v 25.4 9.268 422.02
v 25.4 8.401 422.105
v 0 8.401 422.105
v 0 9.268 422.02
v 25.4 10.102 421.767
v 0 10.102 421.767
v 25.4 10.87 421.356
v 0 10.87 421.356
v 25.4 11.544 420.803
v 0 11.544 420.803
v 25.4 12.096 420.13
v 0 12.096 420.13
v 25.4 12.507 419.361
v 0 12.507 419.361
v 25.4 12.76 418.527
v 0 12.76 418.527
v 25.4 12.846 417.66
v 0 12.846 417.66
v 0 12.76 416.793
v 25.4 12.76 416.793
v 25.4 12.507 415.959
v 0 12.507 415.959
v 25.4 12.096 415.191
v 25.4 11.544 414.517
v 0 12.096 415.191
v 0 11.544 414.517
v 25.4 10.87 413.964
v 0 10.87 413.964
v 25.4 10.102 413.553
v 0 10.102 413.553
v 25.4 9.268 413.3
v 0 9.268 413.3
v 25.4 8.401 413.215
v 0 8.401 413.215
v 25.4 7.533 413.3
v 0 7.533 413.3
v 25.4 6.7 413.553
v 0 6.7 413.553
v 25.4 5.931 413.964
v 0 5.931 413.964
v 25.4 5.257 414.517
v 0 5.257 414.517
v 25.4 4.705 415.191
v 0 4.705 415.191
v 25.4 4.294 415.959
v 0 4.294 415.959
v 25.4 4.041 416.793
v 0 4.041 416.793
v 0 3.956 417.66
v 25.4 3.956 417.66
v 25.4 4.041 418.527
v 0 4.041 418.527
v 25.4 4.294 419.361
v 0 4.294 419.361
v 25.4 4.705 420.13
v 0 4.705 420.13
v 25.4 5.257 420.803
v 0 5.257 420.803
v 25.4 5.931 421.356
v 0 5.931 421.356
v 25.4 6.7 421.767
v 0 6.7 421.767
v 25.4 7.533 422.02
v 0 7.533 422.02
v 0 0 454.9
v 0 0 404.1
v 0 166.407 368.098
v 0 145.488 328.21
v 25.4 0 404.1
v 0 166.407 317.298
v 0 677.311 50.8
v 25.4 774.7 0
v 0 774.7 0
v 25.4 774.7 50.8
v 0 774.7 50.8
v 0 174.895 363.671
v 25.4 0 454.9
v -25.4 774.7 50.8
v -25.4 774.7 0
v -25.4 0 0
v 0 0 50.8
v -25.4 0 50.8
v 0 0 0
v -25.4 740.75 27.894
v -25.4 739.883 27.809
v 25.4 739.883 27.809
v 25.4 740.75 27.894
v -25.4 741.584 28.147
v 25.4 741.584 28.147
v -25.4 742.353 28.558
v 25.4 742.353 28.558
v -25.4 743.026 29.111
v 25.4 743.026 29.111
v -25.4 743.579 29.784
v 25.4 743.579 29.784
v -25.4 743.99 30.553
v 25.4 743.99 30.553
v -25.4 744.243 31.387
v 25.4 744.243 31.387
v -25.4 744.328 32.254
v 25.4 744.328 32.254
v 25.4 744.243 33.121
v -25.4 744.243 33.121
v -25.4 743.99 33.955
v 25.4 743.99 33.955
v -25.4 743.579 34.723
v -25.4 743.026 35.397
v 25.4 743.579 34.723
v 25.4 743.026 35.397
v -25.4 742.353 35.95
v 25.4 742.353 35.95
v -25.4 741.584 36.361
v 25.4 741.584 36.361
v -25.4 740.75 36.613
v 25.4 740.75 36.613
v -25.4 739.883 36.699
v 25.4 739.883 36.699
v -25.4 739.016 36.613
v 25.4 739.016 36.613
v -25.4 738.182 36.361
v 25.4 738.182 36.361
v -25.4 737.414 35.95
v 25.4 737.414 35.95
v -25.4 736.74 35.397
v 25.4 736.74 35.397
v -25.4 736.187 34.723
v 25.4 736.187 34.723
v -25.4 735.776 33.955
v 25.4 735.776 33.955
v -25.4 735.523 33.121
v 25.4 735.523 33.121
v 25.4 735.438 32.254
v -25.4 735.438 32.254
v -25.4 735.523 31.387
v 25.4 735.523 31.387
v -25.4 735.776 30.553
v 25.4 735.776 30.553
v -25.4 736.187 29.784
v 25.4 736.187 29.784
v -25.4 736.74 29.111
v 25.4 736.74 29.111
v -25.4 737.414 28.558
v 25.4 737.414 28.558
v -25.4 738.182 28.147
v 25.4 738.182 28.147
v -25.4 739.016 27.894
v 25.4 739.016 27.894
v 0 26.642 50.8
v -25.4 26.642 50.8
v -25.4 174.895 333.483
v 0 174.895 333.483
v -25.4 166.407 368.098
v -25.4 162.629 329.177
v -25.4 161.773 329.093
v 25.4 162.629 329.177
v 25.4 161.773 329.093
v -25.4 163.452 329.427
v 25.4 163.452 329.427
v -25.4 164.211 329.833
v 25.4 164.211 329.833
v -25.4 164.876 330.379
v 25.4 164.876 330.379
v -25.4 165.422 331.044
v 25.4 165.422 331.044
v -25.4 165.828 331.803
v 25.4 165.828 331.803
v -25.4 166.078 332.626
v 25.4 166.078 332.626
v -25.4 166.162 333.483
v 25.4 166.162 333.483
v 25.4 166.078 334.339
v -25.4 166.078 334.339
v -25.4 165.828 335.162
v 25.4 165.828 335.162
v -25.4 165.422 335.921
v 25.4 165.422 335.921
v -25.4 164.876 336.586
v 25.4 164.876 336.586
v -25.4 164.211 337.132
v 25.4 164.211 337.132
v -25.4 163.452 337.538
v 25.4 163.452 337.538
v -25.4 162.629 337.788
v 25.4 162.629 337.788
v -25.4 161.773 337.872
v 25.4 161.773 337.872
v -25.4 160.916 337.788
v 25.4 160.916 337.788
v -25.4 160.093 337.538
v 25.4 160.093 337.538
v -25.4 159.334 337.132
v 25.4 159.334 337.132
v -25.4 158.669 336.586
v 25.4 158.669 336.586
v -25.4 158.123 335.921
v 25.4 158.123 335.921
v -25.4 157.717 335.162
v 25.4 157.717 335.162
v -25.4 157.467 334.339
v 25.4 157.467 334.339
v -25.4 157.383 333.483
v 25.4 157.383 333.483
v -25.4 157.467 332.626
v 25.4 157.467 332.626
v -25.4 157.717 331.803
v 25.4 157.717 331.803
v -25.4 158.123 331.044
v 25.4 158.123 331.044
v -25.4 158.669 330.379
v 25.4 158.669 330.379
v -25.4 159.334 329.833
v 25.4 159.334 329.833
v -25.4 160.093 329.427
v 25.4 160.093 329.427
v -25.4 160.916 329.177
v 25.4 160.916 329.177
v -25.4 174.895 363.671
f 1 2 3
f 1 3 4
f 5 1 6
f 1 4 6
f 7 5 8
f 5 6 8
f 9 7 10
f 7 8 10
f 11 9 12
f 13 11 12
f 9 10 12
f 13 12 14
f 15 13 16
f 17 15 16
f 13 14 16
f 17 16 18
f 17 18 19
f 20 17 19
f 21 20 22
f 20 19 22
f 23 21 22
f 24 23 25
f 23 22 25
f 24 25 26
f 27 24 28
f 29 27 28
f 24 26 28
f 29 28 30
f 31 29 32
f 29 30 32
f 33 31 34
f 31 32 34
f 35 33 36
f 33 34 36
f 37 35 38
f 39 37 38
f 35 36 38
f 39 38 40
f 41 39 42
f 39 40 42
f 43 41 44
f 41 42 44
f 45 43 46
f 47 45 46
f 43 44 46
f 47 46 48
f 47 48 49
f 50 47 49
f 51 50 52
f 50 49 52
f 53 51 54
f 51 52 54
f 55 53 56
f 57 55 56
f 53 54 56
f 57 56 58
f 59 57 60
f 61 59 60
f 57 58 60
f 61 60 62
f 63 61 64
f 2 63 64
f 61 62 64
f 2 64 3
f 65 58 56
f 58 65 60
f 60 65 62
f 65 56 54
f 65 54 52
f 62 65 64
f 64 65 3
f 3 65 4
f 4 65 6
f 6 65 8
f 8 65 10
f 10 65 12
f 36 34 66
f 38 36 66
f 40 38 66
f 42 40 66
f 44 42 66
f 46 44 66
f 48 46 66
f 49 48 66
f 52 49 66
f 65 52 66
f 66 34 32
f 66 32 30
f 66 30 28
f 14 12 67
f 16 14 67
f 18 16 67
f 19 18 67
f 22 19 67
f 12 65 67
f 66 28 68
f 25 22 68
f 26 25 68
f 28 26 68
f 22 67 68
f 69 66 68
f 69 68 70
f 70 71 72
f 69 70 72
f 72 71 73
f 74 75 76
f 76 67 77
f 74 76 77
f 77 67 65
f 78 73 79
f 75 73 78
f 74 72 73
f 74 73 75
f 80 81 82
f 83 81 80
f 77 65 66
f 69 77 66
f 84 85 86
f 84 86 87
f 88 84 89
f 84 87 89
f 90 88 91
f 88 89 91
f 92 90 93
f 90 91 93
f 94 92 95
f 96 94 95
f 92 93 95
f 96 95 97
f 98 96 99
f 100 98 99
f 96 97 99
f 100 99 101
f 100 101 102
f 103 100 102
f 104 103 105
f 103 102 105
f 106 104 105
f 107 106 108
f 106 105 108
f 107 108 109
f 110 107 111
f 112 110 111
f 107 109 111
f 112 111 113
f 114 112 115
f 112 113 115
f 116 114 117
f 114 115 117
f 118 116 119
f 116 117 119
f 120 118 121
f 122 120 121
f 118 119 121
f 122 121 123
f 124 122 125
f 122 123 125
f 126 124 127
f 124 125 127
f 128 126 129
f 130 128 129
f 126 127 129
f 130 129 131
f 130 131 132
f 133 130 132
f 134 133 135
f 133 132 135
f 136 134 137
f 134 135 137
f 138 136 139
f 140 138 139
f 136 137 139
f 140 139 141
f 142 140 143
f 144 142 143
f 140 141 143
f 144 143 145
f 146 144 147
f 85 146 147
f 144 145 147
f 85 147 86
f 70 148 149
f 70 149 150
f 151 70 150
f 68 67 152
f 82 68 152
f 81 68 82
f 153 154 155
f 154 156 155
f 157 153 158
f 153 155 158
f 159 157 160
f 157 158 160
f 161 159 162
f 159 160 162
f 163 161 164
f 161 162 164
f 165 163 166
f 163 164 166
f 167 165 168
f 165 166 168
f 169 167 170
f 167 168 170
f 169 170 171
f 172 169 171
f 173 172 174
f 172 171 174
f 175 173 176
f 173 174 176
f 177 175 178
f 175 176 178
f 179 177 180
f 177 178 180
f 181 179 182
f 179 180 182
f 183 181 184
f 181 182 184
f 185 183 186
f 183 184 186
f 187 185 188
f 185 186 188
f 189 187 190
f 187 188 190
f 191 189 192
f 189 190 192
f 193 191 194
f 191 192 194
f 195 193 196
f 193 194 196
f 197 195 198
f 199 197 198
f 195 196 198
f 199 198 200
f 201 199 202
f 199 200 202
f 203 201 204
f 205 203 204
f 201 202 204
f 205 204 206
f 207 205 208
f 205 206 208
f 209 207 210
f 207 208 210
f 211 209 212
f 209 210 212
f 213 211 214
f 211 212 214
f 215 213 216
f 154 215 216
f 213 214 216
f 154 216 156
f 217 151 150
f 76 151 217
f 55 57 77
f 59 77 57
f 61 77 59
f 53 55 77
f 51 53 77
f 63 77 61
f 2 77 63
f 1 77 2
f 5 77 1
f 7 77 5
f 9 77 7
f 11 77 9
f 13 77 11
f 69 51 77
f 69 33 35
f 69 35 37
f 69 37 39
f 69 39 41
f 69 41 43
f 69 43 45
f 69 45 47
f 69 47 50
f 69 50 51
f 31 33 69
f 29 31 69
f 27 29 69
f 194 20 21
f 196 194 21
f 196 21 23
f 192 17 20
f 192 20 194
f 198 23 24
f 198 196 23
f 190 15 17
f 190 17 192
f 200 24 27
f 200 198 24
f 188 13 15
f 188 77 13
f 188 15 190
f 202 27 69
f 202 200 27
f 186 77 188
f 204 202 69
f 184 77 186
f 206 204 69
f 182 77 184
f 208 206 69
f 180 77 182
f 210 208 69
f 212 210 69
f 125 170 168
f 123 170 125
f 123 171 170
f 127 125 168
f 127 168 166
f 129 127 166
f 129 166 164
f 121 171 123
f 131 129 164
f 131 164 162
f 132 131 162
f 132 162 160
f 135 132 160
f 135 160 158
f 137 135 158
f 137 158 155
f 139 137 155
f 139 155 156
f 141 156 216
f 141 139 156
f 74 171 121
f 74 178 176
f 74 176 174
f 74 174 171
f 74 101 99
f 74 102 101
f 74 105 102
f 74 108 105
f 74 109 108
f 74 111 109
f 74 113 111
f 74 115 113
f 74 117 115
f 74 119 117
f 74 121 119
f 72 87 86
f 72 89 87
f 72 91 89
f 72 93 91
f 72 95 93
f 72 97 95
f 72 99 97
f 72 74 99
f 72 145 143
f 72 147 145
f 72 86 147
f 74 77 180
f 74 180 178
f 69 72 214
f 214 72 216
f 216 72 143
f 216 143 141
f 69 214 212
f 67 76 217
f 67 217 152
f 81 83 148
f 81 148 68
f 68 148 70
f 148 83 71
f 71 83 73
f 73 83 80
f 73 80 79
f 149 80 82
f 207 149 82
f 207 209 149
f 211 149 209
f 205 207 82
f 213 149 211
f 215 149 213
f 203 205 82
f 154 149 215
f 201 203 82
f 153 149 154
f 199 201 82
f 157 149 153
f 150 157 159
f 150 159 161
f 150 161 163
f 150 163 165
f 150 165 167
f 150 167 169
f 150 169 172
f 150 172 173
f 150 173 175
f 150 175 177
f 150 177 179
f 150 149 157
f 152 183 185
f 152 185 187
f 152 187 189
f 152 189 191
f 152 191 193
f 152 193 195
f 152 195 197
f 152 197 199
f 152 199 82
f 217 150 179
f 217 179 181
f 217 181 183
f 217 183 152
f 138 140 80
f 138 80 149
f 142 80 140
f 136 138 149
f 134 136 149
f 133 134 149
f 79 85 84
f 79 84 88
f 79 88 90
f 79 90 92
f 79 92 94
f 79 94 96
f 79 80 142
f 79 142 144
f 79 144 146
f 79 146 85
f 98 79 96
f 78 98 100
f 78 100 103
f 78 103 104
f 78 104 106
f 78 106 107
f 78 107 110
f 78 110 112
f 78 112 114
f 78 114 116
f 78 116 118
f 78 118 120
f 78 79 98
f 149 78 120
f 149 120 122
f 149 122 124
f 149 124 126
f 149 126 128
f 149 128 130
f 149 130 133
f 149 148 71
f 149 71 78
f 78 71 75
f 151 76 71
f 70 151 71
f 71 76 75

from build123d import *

# Parameters (mm, degrees)
BOSS_EXTRUDE1_DEPTH = 25.4
SKETCH2_R           = 4.389630664
BOSS_EXTRUDE4_DEPTH = 25.4
CUT_EXTRUDE1_START  = -25.4
SKETCH4_R           = 4.389630664
CUT_EXTRUDE1_DEPTH  = 25.4
SKETCH6_R           = 4.445
CUT_EXTRUDE2_DEPTH  = 25.4
SKETCH7_W           = 50.8
SKETCH7_H           = 774.7
BOSS_EXTRUDE5_DEPTH = 25.4
SKETCH8_R           = 4.445
CUT_EXTRUDE3_DEPTH  = 50.8


with BuildPart() as part:
    # Sketch1 → Boss-Extrude1 (new body)
    with BuildSketch(Plane(origin=(0, 0, 0), x_dir=(0, 0, -1), z_dir=(1, 0, 0))):
        Polygon((-50.8, 774.7), (-454.899551596, 0), (-404.099551596, 0), (0, 774.7), align=None)
    extrude(amount=BOSS_EXTRUDE1_DEPTH)

    # Sketch2 → Boss-Extrude4 (add)
    with BuildSketch(Plane(origin=(0, 0, 0), x_dir=(0, 0, -1), z_dir=(1, 0, 0))):
        Polygon((0, 0), (-333.48251995, 174.895038051), (-363.670680481, 174.895038051), (-368.098145545, 166.407136563), (-50.8, 0), align=None)
        with Locations((-333.48251995, 161.772531454)):
            Circle(SKETCH2_R, mode=Mode.SUBTRACT)
    extrude(amount=-BOSS_EXTRUDE4_DEPTH)

    # Sketch4 → Cut-Extrude1 (cut)
    with BuildSketch(Plane.ZY.offset(CUT_EXTRUDE1_START)):
        with Locations(Location((333.48251995, 161.772531454, 0), (0, 0, 180))):
            Circle(SKETCH4_R)
    extrude(amount=CUT_EXTRUDE1_DEPTH, mode=Mode.SUBTRACT)

    # Sketch6 → Cut-Extrude2 (cut)
    with BuildSketch(Plane.ZY):
        with Locations((417.660059318, 8.400584223)):
            Circle(SKETCH6_R)
    extrude(amount=-CUT_EXTRUDE2_DEPTH, mode=Mode.SUBTRACT)

    # Sketch7 → Boss-Extrude5 (add)
    with BuildSketch(Plane.ZY):
        with Locations((25.4, 387.35)):
            Rectangle(SKETCH7_W, SKETCH7_H)
    extrude(amount=BOSS_EXTRUDE5_DEPTH)

    # Sketch8 → Cut-Extrude3 (cut)
    with BuildSketch(Plane(origin=(25.4, 0, 0), x_dir=(0, 0, -1), z_dir=(1, 0, 0))):
        with Locations((-32.253882692, 739.883035965)):
            Circle(SKETCH8_R)
    extrude(amount=-CUT_EXTRUDE3_DEPTH, mode=Mode.SUBTRACT)


solid = part.part
